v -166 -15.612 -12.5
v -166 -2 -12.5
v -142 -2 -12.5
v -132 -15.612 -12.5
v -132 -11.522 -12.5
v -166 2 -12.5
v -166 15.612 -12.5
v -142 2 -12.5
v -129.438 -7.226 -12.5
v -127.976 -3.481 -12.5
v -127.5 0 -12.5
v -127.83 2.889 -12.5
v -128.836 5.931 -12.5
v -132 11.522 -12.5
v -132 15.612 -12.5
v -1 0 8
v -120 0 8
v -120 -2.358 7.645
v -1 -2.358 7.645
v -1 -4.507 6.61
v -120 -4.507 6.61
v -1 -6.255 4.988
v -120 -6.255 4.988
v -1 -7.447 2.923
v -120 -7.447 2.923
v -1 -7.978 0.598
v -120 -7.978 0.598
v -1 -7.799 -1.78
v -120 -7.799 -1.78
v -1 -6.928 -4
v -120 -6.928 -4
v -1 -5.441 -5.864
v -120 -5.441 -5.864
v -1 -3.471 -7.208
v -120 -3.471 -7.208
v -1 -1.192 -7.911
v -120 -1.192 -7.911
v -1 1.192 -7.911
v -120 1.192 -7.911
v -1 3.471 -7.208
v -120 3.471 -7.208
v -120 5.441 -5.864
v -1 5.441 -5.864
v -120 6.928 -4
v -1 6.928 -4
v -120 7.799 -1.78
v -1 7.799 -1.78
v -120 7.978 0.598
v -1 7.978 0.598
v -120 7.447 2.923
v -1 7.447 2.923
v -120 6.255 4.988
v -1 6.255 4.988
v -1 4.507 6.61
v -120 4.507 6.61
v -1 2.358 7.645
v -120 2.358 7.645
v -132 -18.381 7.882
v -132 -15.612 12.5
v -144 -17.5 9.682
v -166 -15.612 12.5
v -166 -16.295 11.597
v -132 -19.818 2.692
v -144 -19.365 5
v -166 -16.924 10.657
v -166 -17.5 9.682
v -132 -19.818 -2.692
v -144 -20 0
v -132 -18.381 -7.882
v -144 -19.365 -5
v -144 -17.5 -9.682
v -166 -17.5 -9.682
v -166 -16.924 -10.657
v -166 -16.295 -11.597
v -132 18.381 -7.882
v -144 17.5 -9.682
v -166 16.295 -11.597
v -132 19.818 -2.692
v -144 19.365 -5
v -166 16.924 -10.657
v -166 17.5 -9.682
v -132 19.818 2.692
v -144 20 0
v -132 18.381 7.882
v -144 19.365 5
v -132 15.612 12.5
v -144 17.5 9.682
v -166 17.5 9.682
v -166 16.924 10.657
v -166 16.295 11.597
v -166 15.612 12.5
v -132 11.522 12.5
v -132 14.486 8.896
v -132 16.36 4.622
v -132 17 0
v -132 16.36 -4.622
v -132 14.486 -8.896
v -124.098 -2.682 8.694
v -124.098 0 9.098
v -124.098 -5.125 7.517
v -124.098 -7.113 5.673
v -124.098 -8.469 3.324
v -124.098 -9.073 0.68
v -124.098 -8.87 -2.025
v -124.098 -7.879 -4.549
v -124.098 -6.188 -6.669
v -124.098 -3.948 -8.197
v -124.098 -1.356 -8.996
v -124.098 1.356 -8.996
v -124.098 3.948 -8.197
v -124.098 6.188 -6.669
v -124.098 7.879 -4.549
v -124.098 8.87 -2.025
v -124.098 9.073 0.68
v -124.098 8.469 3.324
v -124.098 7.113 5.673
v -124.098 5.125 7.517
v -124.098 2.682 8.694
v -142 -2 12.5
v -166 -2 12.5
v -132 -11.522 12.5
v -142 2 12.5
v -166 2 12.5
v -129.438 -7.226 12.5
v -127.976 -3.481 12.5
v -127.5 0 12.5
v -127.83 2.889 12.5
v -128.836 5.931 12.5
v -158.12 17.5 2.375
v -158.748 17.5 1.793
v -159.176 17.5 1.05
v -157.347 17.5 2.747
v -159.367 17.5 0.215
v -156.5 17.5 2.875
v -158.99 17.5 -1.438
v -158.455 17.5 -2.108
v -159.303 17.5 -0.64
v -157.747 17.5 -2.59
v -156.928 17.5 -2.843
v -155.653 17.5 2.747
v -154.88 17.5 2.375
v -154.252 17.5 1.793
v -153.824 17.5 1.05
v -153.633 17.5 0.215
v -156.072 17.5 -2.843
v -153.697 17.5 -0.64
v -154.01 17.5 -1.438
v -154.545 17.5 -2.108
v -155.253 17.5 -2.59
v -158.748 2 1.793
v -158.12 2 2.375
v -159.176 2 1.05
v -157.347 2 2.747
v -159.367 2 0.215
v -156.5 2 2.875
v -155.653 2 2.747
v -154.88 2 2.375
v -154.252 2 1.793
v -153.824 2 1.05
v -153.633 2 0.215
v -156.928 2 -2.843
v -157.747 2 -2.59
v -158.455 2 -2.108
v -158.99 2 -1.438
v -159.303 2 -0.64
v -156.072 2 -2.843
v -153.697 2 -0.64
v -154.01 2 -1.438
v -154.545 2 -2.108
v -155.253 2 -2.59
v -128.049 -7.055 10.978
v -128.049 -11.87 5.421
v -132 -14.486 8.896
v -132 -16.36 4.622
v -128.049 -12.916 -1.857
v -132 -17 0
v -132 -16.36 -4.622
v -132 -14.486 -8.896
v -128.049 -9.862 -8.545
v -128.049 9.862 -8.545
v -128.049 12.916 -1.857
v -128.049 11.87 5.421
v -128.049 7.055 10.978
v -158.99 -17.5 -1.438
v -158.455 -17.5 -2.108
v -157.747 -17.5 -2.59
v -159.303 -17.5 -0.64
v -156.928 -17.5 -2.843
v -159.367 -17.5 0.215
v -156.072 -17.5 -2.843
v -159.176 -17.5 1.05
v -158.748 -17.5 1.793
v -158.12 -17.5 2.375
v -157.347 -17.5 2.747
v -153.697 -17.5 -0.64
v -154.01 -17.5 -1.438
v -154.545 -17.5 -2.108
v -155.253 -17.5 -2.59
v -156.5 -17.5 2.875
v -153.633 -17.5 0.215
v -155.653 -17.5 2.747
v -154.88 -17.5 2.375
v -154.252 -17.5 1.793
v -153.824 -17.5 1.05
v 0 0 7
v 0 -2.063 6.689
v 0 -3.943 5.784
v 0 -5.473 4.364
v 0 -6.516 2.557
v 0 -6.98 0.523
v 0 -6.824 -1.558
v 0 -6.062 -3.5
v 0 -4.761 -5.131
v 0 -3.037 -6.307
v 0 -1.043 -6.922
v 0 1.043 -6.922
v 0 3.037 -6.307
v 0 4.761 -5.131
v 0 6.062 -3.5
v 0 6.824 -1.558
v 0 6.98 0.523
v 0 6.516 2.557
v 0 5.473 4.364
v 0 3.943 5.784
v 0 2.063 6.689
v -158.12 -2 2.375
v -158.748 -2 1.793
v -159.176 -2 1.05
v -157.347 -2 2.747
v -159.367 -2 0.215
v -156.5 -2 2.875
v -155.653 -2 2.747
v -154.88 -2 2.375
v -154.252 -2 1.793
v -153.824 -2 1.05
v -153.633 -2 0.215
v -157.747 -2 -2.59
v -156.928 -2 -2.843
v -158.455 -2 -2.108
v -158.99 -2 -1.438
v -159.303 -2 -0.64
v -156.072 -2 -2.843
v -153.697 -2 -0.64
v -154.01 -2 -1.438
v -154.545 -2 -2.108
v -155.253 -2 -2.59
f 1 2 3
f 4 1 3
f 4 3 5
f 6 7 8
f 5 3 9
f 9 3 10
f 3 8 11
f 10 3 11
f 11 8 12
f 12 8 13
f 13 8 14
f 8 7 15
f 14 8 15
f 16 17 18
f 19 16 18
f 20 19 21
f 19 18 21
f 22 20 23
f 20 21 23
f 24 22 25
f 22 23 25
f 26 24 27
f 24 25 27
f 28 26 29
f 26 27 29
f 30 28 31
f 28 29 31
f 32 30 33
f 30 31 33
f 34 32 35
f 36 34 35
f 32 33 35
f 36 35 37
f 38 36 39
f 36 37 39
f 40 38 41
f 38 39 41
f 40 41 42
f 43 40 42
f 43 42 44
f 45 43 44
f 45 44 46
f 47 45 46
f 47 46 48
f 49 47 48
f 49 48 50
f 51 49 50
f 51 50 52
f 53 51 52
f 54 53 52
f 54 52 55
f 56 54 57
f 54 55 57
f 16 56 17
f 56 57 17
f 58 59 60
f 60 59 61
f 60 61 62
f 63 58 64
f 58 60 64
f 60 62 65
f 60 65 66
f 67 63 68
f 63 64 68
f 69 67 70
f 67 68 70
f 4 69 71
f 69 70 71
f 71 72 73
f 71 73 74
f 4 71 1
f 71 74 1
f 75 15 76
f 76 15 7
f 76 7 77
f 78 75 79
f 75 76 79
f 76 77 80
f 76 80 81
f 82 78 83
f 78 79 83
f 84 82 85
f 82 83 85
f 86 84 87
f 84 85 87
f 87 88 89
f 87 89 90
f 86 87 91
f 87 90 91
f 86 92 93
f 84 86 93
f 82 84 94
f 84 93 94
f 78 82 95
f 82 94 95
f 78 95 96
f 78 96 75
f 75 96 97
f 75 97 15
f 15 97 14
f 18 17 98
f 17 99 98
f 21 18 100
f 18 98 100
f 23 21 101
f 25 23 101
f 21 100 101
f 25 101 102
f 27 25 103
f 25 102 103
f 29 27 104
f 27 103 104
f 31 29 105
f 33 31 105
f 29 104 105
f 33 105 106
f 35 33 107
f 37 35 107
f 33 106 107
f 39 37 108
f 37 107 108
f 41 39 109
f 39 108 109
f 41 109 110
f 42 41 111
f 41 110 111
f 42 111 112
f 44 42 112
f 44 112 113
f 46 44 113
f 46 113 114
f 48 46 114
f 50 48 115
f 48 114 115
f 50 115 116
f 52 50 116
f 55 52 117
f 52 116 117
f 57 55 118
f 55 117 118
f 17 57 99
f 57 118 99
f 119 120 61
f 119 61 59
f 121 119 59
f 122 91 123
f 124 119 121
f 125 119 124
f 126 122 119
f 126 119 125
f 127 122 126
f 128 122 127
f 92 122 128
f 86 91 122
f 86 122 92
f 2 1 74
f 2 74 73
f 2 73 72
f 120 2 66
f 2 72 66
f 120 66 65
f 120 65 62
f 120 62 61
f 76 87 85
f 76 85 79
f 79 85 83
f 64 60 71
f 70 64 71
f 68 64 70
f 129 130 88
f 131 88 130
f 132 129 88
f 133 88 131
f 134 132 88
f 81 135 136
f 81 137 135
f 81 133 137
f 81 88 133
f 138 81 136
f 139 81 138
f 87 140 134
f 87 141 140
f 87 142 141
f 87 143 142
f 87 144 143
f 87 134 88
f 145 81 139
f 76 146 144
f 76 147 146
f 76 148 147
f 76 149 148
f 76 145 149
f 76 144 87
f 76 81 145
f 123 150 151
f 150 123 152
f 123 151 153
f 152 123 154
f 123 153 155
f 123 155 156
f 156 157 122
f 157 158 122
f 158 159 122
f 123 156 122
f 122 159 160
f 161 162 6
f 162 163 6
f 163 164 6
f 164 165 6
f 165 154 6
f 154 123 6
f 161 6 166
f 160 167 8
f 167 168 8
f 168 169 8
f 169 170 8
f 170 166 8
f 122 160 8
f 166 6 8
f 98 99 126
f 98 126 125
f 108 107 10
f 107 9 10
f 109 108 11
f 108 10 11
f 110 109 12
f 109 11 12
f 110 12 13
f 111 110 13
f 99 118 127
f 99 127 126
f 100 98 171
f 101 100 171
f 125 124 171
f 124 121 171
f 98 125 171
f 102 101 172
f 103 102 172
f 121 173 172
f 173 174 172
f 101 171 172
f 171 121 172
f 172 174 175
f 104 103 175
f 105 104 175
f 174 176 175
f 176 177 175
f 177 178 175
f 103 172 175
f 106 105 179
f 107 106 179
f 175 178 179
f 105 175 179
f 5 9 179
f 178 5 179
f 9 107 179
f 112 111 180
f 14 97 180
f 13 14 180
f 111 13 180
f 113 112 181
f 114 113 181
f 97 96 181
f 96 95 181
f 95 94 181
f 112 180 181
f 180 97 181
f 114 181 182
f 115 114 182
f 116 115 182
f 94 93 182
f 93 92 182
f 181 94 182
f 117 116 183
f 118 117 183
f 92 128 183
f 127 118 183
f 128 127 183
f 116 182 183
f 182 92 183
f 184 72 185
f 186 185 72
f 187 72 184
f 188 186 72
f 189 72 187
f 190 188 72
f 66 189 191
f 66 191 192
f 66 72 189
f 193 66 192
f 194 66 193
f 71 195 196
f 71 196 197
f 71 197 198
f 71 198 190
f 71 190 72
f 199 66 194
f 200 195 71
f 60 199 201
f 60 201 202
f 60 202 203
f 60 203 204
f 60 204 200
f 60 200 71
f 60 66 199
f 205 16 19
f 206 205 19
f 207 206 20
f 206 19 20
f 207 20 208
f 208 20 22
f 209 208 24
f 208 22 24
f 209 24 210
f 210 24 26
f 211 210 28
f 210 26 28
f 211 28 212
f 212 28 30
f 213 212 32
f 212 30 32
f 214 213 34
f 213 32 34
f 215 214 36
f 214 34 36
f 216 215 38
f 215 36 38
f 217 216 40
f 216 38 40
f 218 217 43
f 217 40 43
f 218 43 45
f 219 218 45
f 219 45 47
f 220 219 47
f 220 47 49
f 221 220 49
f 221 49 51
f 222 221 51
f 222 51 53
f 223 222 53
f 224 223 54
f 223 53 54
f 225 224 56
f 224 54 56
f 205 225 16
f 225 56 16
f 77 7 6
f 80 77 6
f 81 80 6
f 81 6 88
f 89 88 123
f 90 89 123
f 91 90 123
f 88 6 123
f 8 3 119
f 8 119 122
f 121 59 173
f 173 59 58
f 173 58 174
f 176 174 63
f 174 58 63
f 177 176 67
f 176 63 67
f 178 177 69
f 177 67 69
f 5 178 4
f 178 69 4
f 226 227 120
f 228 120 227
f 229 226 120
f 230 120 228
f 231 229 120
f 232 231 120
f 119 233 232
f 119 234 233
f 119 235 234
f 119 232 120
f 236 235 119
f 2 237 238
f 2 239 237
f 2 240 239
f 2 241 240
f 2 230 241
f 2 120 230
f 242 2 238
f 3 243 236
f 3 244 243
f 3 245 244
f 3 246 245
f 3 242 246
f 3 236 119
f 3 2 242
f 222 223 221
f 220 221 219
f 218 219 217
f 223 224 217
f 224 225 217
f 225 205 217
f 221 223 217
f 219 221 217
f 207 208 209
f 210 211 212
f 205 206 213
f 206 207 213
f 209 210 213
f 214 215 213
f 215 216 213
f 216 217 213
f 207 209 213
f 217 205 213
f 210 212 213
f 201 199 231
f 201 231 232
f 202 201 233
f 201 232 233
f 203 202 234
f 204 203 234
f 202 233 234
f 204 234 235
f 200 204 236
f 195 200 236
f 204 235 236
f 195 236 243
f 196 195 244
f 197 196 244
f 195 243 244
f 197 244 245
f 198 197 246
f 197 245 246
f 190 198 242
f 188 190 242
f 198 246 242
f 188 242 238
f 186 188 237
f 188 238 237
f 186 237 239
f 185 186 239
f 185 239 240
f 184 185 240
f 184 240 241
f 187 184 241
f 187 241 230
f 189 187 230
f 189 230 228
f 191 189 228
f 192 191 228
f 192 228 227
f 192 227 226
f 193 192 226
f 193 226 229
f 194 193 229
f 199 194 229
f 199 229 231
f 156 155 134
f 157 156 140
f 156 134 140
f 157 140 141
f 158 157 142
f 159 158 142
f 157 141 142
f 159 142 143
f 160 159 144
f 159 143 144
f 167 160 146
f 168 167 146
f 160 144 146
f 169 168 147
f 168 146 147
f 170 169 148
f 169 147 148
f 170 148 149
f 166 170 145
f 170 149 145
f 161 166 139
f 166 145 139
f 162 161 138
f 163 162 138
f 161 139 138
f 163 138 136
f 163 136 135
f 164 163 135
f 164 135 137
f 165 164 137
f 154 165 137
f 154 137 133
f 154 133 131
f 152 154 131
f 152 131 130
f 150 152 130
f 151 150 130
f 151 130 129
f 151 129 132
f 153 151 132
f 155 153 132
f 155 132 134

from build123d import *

# Parameters (mm, degrees)
SKIZZE2_W                       = 22
SKIZZE2_H                       = 2.5
SKIZZE2_W_2                     = 24
SKIZZE2_H_2                     = 4
SCHNITT_LINEAR_AUSTRAGEN1_DEPTH = 50
SKIZZE3_R                       = 2.875
SKIZZE3_W                       = 38.5
SKIZZE3_H                       = 7.5
SCHNITT_LINEAR_AUSTRAGEN2_DEPTH = 38.5
FASE1_SIZE                      = 1


with BuildPart() as part:
    # Skizze1 → Rotation1 (revolve)
    with BuildSketch(Plane.XY, mode=Mode.PRIVATE) as rotation1_sk:
        Polygon((0, 0), (0, 8), (-120, 8), (-124.098076211, 9.098076211), (-132, 17), (-132, 20), (-166, 20), (-166, 0), align=None)
    revolve(rotation1_sk.sketch.rotate(Axis((0, 0, 0), (1, 0, 0)), 90), axis=Axis((0, 0, 0), (1, 0, 0)))  # turned: the seam where the file's is

    # Skizze2 → Schnitt-Linear austragen1 (cut, symmetric)
    with BuildSketch(Plane.XY):
        with Locations((-155, 18.75)):
            Rectangle(SKIZZE2_W, SKIZZE2_H)
        with Locations((-154, 0)):
            Rectangle(SKIZZE2_W_2, SKIZZE2_H_2)
        with Locations((-155, -18.75)):
            Rectangle(SKIZZE2_W, SKIZZE2_H)
    extrude(amount=SCHNITT_LINEAR_AUSTRAGEN1_DEPTH, both=True, mode=Mode.SUBTRACT)

    # Skizze3 → Schnitt-Linear austragen2 (cut, through all)
    with BuildSketch(Plane(origin=(0, 17.5, 0), x_dir=(1, 0, 0), z_dir=(0, 1, 0))):
        with Locations(Location((-156.5, 0, 0), (0, 0, 270))):  # turned: the seam where the file's is
            Circle(SKIZZE3_R)
        with Locations((-146.75, -16.25)):
            Rectangle(SKIZZE3_W, SKIZZE3_H)
        with Locations((-146.75, 16.25)):
            Rectangle(SKIZZE3_W, SKIZZE3_H)
    extrude(amount=-SCHNITT_LINEAR_AUSTRAGEN2_DEPTH, mode=Mode.SUBTRACT)

    # Fase1
    fase1_edges = [part.edges().sort_by_distance(p)[0] for p in [
        (0, 0, -8),
    ]]
    chamfer(fase1_edges, length=FASE1_SIZE)


solid = part.part
